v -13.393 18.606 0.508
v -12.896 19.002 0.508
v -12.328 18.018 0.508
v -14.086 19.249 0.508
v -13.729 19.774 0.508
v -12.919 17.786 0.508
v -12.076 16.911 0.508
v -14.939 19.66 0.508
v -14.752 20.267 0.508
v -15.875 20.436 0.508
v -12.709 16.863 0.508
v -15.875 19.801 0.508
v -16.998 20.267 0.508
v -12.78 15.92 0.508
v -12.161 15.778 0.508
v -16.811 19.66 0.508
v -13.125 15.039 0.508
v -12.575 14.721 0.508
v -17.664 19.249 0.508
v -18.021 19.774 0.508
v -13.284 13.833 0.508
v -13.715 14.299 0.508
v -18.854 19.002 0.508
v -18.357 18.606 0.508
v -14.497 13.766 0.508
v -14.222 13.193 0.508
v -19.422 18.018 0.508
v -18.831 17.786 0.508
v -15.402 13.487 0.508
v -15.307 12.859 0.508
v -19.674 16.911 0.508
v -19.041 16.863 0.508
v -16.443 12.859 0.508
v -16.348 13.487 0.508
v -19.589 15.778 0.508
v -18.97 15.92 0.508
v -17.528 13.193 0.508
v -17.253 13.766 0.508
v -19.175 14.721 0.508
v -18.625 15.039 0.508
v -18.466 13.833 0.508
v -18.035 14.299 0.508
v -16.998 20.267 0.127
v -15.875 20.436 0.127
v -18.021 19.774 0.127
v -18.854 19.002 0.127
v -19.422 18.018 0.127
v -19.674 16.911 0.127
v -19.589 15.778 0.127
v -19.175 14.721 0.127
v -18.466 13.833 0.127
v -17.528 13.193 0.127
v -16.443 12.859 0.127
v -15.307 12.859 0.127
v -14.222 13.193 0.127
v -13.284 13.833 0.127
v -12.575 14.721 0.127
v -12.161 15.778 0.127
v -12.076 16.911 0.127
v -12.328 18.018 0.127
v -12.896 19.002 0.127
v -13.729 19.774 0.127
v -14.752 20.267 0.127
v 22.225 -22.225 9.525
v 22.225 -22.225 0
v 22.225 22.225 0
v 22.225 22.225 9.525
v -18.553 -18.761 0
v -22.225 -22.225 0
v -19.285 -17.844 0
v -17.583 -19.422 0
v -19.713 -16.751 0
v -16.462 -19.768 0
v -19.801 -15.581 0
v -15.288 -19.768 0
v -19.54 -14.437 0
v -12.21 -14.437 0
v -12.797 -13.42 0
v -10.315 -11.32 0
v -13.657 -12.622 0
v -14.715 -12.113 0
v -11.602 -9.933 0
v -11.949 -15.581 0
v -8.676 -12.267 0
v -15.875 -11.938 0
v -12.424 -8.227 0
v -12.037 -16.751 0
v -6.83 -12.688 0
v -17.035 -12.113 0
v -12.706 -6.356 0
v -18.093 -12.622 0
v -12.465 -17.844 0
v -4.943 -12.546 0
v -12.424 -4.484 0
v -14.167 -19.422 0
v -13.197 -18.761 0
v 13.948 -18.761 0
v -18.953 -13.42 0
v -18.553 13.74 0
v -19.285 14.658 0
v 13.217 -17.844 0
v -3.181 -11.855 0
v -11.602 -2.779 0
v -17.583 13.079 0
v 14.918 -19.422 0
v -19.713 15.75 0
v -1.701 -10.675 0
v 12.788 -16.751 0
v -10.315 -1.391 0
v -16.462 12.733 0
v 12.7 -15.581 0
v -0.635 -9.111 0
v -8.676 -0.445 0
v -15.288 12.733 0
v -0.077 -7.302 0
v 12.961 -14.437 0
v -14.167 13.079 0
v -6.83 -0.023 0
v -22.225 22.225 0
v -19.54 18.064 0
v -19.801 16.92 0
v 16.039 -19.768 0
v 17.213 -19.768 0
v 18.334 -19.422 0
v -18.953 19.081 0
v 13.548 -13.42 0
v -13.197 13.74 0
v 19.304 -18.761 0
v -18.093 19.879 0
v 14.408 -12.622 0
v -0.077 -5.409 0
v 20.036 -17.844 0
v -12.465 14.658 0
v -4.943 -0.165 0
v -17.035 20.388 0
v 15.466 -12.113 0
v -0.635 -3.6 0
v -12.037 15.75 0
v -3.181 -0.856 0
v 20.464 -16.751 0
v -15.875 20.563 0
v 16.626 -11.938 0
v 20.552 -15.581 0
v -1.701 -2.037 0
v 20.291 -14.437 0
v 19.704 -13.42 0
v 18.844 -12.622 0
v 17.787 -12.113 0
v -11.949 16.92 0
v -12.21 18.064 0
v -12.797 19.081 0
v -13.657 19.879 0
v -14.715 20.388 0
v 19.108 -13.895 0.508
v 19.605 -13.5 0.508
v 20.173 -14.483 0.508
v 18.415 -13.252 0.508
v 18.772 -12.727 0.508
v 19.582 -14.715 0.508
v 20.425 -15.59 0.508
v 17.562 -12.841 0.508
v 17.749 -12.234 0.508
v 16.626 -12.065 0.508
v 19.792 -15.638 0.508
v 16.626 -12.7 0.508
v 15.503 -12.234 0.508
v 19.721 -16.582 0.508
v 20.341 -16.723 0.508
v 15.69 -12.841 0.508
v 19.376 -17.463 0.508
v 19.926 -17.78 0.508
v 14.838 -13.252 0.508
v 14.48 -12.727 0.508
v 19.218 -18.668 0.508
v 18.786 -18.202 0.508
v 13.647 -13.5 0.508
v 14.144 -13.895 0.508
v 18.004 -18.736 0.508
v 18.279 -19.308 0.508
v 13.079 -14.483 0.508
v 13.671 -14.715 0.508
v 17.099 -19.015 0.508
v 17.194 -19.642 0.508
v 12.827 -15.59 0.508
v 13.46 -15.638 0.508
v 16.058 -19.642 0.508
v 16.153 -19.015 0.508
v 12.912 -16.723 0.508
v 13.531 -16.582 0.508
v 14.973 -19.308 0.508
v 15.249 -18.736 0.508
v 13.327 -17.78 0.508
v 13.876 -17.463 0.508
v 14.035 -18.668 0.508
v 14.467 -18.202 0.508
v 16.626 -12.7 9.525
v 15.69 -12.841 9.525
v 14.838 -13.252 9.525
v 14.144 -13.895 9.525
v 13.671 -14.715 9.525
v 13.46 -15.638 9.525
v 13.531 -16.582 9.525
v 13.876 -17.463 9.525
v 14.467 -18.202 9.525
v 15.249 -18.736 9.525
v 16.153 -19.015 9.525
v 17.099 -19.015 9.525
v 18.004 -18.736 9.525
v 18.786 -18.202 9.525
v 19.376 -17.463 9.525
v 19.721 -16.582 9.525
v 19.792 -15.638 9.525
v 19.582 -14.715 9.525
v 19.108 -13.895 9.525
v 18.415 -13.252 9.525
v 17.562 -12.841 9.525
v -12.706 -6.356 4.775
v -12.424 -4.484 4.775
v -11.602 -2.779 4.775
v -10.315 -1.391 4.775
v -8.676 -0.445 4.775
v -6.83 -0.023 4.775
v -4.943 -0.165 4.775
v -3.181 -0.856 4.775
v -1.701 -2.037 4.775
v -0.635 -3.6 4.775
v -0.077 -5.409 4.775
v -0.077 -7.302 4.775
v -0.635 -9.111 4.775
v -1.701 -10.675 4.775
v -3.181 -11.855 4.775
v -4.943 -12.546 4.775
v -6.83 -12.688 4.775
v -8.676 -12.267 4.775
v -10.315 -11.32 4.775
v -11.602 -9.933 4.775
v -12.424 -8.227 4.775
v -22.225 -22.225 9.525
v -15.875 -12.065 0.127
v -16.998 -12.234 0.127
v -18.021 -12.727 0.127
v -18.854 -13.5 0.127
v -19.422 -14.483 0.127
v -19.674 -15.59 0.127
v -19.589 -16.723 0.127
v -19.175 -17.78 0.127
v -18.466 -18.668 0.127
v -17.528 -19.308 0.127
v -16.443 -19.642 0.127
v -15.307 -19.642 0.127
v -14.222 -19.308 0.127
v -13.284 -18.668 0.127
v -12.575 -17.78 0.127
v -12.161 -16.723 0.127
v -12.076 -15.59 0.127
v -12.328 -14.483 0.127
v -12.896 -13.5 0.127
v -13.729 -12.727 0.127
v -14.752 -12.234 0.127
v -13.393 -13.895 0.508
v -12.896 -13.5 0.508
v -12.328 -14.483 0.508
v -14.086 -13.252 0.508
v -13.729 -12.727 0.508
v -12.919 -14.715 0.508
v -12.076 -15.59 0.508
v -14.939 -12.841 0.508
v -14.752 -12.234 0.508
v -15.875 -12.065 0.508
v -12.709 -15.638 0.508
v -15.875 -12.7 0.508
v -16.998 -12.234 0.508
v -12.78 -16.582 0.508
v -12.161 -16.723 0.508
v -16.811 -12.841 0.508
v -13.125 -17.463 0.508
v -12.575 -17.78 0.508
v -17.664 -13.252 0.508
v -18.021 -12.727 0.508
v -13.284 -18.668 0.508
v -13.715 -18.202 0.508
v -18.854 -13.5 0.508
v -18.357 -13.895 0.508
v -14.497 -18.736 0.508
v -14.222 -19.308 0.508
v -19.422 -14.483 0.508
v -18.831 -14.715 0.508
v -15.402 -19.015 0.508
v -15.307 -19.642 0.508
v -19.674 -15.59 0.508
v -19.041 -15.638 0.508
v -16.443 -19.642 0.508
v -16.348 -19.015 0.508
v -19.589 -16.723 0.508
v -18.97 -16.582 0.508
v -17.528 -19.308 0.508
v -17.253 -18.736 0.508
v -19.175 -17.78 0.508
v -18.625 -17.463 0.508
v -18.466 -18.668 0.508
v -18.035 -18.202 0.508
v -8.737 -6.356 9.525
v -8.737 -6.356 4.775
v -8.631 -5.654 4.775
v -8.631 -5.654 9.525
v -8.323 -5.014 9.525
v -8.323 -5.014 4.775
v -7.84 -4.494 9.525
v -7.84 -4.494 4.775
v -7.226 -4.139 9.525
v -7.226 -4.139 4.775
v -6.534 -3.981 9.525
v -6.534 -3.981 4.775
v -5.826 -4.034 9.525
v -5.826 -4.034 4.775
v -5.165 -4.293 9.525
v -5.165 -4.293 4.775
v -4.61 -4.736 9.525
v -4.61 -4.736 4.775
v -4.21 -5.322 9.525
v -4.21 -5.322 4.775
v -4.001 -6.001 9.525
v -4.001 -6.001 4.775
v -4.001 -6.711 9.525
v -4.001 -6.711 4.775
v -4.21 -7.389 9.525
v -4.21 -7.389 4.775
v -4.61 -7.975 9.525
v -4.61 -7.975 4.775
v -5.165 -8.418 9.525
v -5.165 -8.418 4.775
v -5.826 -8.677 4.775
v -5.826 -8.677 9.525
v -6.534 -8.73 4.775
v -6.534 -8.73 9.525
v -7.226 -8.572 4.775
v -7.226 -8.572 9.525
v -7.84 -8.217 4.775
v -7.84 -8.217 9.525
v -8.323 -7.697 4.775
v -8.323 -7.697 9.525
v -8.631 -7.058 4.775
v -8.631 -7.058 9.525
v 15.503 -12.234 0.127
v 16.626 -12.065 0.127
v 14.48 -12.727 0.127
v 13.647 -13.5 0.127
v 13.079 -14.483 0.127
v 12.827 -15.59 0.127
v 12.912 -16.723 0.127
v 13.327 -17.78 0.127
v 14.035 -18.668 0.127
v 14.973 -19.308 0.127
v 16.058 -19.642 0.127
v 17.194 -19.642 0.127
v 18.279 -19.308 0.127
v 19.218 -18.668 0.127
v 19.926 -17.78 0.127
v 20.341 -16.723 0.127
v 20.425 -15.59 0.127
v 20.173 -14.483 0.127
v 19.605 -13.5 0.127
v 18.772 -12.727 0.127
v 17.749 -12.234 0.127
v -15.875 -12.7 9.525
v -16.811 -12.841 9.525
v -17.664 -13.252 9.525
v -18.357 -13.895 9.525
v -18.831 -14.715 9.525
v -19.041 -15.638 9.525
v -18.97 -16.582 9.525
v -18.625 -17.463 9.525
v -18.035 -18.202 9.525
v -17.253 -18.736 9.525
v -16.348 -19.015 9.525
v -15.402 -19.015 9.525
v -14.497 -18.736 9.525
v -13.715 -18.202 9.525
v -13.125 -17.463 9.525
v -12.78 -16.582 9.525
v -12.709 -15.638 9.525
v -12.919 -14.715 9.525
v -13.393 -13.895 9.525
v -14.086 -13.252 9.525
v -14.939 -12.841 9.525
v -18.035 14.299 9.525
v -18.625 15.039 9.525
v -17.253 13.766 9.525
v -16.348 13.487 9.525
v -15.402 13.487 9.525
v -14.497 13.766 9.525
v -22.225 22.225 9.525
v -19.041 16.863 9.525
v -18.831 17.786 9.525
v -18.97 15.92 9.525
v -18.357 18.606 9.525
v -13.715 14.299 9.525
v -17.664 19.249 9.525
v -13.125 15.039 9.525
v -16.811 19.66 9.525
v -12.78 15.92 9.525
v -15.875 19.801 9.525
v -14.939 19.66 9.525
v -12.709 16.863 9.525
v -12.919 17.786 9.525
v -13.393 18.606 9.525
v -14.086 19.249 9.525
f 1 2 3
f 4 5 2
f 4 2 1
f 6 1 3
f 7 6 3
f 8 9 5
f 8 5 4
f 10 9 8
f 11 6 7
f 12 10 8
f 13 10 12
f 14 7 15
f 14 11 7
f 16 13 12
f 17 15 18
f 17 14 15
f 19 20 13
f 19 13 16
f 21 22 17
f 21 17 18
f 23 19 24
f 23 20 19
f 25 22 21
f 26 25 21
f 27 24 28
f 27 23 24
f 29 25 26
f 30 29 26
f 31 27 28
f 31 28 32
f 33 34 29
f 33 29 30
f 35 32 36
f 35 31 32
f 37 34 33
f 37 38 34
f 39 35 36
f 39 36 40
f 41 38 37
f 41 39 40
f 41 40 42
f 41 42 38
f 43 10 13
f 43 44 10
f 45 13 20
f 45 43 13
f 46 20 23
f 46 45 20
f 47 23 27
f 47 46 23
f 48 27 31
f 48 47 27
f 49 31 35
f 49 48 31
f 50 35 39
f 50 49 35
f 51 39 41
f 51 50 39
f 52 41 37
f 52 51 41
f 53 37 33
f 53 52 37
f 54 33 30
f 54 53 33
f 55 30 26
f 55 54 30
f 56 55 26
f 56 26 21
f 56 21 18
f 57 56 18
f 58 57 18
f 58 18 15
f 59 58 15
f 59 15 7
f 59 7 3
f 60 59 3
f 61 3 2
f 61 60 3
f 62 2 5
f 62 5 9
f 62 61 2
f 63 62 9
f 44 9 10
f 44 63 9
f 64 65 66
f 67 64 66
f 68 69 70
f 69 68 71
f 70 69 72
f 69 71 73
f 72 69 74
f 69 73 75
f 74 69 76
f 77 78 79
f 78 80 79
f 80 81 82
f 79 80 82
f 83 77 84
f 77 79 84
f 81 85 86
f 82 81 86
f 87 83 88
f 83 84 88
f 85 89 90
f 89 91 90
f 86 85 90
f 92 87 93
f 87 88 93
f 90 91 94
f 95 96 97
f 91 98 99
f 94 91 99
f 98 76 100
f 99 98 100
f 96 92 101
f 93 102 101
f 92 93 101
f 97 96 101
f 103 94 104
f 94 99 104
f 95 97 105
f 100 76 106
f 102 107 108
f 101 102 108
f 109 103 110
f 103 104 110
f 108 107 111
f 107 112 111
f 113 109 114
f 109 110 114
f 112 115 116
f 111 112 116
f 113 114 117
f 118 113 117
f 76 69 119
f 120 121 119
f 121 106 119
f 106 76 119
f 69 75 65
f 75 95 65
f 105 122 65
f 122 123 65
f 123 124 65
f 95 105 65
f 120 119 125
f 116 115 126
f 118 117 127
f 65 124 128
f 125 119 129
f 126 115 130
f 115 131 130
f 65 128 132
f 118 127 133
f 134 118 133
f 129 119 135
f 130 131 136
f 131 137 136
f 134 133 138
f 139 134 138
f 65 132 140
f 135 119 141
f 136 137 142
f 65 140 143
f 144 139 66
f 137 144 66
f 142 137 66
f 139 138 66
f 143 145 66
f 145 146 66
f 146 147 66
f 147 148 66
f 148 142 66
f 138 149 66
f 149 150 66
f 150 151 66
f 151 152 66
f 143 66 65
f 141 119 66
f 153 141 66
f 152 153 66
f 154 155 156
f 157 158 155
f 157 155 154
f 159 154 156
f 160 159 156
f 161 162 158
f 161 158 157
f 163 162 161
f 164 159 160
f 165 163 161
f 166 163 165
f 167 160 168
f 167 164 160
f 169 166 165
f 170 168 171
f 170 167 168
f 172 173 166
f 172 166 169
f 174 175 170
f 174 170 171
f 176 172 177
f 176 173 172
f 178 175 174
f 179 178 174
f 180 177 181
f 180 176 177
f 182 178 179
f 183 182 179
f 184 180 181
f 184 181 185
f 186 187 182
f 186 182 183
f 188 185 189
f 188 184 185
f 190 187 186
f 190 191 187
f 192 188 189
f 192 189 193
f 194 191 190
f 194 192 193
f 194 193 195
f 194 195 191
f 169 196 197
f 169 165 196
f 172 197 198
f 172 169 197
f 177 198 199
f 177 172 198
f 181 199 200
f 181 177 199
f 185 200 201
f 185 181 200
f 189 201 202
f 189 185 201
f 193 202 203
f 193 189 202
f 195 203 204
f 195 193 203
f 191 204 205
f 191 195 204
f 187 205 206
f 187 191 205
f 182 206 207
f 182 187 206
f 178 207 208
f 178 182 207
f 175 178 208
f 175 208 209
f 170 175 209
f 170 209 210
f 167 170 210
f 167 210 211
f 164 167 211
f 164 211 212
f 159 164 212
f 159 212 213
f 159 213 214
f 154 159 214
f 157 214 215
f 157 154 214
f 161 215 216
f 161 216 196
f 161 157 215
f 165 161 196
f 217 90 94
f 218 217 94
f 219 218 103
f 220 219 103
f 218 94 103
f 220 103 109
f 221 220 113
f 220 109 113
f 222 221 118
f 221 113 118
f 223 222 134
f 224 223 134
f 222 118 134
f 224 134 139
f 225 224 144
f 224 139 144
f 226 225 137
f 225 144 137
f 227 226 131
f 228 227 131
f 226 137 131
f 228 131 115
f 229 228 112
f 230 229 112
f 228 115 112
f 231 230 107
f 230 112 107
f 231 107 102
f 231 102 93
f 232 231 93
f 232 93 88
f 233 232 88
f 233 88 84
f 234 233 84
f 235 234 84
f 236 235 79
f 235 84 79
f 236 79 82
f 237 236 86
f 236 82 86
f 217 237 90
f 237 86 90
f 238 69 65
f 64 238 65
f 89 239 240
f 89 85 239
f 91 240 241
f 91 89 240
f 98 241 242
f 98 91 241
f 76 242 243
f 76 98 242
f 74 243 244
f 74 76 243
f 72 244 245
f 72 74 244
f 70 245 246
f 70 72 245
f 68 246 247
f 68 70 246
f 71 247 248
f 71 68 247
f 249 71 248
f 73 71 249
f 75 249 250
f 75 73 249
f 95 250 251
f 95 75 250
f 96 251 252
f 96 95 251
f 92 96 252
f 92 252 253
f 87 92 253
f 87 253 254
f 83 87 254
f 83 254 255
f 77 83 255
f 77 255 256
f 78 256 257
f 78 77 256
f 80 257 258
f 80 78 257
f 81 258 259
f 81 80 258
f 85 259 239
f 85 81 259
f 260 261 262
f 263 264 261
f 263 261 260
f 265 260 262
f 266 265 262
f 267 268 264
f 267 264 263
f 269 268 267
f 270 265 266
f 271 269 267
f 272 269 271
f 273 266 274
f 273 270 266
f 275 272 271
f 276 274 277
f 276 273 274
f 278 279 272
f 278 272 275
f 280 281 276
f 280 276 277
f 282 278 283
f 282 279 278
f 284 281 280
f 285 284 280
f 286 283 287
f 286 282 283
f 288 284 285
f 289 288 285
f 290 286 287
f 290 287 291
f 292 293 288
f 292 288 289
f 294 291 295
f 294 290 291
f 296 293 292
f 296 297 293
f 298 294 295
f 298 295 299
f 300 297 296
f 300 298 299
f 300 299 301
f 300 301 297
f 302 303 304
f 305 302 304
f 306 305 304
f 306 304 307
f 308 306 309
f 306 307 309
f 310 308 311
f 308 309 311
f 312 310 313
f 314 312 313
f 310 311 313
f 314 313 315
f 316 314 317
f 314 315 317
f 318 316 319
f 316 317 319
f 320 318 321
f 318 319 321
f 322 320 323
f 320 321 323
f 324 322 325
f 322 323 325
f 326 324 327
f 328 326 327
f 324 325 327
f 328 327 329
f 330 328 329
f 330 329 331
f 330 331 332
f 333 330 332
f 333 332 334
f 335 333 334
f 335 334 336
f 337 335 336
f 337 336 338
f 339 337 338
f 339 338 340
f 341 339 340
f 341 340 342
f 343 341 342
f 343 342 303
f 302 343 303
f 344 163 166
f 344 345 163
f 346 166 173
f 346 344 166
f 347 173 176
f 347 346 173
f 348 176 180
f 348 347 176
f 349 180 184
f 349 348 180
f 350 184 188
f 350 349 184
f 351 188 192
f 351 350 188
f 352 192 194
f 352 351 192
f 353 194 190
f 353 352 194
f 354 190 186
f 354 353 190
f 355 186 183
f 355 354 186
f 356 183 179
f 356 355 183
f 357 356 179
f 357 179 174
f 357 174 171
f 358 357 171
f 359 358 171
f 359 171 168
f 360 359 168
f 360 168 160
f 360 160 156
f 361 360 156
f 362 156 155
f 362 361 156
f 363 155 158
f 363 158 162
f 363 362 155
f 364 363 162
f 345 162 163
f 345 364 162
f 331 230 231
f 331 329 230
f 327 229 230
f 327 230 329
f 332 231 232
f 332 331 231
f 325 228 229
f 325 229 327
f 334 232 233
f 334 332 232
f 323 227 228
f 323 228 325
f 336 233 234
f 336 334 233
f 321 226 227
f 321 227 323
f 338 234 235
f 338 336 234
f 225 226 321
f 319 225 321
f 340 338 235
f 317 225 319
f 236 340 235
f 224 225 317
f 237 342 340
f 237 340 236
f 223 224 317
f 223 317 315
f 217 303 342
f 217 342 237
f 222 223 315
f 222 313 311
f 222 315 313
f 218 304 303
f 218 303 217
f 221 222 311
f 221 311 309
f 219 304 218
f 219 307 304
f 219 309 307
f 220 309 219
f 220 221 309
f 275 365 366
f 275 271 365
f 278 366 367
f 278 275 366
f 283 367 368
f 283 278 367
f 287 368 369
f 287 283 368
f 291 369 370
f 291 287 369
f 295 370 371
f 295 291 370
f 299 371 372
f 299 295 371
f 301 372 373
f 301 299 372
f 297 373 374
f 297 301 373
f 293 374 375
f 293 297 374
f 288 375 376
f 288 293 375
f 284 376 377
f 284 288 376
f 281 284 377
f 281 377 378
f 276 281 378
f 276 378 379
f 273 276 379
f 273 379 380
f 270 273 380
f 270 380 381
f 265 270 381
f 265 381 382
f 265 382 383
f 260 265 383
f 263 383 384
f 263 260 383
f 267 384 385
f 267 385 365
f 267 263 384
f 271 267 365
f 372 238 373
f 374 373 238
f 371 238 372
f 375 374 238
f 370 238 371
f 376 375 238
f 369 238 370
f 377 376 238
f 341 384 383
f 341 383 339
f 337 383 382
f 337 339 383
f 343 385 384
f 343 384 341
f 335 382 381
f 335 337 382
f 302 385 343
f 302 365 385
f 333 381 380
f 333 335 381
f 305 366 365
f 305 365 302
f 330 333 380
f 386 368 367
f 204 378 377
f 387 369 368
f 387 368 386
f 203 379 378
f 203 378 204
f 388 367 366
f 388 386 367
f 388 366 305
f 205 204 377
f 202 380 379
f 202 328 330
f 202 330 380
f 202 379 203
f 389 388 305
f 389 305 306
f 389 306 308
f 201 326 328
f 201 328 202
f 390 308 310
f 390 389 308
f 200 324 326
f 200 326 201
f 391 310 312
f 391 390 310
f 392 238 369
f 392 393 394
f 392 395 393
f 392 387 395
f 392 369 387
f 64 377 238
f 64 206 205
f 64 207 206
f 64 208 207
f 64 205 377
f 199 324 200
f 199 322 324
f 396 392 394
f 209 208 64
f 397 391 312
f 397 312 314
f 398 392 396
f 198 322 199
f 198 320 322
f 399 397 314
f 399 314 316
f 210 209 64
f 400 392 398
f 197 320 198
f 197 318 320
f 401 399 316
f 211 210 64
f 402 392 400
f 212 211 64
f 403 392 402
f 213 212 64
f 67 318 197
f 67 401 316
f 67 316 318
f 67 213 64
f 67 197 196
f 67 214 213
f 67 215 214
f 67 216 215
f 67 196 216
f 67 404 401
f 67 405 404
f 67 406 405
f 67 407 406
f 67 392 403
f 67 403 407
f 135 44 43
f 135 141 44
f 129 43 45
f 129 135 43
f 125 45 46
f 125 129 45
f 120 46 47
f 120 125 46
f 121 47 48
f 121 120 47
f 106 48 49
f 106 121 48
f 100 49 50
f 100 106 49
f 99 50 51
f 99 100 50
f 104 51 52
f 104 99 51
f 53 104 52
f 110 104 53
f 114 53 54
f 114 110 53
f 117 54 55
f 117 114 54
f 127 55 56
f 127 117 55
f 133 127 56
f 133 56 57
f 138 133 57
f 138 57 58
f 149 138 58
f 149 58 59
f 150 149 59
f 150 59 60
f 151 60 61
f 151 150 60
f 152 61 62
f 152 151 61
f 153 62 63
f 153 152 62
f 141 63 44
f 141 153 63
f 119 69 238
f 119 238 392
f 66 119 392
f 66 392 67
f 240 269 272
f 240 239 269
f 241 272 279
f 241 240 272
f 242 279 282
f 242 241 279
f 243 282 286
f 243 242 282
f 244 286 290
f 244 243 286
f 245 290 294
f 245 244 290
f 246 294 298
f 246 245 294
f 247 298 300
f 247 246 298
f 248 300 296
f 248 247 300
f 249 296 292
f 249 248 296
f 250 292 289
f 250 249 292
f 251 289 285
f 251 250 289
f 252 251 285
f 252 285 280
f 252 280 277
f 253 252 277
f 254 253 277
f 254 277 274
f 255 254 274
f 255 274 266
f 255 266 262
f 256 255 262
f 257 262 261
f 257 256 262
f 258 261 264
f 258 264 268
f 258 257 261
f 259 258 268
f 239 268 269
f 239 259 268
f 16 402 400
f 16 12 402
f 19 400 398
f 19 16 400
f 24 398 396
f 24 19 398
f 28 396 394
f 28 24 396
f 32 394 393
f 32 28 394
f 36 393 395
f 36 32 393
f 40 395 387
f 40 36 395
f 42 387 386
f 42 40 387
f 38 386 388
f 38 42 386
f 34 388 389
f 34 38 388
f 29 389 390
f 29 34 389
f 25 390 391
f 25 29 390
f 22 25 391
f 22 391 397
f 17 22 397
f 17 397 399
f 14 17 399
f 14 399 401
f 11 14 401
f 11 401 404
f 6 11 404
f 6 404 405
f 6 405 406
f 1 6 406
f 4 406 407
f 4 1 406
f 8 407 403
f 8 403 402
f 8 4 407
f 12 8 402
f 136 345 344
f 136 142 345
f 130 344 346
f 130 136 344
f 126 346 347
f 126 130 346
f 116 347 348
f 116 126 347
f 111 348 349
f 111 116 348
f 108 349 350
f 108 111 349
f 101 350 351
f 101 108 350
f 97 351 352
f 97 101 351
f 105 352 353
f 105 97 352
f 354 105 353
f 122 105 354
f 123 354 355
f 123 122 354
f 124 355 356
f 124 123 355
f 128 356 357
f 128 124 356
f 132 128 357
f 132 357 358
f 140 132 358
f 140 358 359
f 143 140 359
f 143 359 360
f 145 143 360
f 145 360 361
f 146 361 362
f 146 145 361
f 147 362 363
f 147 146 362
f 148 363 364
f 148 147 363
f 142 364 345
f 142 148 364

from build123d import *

# Parameters (mm, degrees)
SKETCH1_W                  = 44.45
SKETCH1_H                  = 44.45
BOSS_EXTRUDE1_DEPTH        = 9.525
CBORE_FOR_1_4_1_AT_2_COUNT = 2
CBORE_FOR_1_4_1_AT_2_PITCH = 45.963472584
CBORE_FOR_1_4_1_AT_3_COUNT = 2
CBORE_FOR_1_4_1_AT_3_PITCH = 32.501083151
SKETCH6_R                  = 6.35
CUT_EXTRUDE1_DEPTH         = 4.7752
SKETCH7_R                  = 2.38125
CUT_EXTRUDE2_DEPTH         = 33.842455374


with BuildPart() as part:
    # Sketch1 → Boss-Extrude1 (new body)
    with BuildSketch(Plane.XY):
        Rectangle(SKETCH1_W, SKETCH1_H)
    extrude(amount=BOSS_EXTRUDE1_DEPTH)

    # Sketch5 → CBORE for 1/4 _1 (revolve, cut)
    with BuildSketch(Plane(origin=(-15.875, 16.626083151, 0), x_dir=(0, 1, 0), z_dir=(1, 0, 0))):
        Polygon((0, 0), (0, 9.525), (3.175, 9.525), (3.175, 0.508), (3.81, 0.508), (3.81, 0.127), (3.937, 0), align=None)
    cbore_for_1_4_1 = revolve(axis=Axis((-15.875, 16.626083151, -6.35), (0, 0, 1)), mode=Mode.SUBTRACT)

    # CBORE for 1/4 _1 at 2: CBORE for 1/4 _1 ×2
    with Locations(*[Vector(0.7071067811865476, -0.7071067811865476, 0) * (i * CBORE_FOR_1_4_1_AT_2_PITCH) for i in range(1, CBORE_FOR_1_4_1_AT_2_COUNT)]):
        add(cbore_for_1_4_1, mode=Mode.SUBTRACT)

    # CBORE for 1/4 _1 at 3: CBORE for 1/4 _1 ×2
    with Locations(*[(0, -i * CBORE_FOR_1_4_1_AT_3_PITCH, 0) for i in range(1, CBORE_FOR_1_4_1_AT_3_COUNT)]):
        add(cbore_for_1_4_1, mode=Mode.SUBTRACT)

    # Sketch6 → Cut-Extrude1 (cut)
    with BuildSketch(Plane(origin=(0, 0, 0), x_dir=(-1, 0, 0), z_dir=(0, 0, -1))):
        with Locations((6.355653141, -6.355653141)):
            Circle(SKETCH6_R)
    extrude(amount=-CUT_EXTRUDE1_DEPTH, mode=Mode.SUBTRACT)

    # Sketch7 → Cut-Extrude2 (cut, through all)
    with BuildSketch(Plane(origin=(0, 0, 0), x_dir=(-1, 0, 0), z_dir=(0, 0, -1))):
        with Locations((6.355653141, -6.355653141)):
            Circle(SKETCH7_R)
    extrude(amount=-CUT_EXTRUDE2_DEPTH, mode=Mode.SUBTRACT)


solid = part.part
